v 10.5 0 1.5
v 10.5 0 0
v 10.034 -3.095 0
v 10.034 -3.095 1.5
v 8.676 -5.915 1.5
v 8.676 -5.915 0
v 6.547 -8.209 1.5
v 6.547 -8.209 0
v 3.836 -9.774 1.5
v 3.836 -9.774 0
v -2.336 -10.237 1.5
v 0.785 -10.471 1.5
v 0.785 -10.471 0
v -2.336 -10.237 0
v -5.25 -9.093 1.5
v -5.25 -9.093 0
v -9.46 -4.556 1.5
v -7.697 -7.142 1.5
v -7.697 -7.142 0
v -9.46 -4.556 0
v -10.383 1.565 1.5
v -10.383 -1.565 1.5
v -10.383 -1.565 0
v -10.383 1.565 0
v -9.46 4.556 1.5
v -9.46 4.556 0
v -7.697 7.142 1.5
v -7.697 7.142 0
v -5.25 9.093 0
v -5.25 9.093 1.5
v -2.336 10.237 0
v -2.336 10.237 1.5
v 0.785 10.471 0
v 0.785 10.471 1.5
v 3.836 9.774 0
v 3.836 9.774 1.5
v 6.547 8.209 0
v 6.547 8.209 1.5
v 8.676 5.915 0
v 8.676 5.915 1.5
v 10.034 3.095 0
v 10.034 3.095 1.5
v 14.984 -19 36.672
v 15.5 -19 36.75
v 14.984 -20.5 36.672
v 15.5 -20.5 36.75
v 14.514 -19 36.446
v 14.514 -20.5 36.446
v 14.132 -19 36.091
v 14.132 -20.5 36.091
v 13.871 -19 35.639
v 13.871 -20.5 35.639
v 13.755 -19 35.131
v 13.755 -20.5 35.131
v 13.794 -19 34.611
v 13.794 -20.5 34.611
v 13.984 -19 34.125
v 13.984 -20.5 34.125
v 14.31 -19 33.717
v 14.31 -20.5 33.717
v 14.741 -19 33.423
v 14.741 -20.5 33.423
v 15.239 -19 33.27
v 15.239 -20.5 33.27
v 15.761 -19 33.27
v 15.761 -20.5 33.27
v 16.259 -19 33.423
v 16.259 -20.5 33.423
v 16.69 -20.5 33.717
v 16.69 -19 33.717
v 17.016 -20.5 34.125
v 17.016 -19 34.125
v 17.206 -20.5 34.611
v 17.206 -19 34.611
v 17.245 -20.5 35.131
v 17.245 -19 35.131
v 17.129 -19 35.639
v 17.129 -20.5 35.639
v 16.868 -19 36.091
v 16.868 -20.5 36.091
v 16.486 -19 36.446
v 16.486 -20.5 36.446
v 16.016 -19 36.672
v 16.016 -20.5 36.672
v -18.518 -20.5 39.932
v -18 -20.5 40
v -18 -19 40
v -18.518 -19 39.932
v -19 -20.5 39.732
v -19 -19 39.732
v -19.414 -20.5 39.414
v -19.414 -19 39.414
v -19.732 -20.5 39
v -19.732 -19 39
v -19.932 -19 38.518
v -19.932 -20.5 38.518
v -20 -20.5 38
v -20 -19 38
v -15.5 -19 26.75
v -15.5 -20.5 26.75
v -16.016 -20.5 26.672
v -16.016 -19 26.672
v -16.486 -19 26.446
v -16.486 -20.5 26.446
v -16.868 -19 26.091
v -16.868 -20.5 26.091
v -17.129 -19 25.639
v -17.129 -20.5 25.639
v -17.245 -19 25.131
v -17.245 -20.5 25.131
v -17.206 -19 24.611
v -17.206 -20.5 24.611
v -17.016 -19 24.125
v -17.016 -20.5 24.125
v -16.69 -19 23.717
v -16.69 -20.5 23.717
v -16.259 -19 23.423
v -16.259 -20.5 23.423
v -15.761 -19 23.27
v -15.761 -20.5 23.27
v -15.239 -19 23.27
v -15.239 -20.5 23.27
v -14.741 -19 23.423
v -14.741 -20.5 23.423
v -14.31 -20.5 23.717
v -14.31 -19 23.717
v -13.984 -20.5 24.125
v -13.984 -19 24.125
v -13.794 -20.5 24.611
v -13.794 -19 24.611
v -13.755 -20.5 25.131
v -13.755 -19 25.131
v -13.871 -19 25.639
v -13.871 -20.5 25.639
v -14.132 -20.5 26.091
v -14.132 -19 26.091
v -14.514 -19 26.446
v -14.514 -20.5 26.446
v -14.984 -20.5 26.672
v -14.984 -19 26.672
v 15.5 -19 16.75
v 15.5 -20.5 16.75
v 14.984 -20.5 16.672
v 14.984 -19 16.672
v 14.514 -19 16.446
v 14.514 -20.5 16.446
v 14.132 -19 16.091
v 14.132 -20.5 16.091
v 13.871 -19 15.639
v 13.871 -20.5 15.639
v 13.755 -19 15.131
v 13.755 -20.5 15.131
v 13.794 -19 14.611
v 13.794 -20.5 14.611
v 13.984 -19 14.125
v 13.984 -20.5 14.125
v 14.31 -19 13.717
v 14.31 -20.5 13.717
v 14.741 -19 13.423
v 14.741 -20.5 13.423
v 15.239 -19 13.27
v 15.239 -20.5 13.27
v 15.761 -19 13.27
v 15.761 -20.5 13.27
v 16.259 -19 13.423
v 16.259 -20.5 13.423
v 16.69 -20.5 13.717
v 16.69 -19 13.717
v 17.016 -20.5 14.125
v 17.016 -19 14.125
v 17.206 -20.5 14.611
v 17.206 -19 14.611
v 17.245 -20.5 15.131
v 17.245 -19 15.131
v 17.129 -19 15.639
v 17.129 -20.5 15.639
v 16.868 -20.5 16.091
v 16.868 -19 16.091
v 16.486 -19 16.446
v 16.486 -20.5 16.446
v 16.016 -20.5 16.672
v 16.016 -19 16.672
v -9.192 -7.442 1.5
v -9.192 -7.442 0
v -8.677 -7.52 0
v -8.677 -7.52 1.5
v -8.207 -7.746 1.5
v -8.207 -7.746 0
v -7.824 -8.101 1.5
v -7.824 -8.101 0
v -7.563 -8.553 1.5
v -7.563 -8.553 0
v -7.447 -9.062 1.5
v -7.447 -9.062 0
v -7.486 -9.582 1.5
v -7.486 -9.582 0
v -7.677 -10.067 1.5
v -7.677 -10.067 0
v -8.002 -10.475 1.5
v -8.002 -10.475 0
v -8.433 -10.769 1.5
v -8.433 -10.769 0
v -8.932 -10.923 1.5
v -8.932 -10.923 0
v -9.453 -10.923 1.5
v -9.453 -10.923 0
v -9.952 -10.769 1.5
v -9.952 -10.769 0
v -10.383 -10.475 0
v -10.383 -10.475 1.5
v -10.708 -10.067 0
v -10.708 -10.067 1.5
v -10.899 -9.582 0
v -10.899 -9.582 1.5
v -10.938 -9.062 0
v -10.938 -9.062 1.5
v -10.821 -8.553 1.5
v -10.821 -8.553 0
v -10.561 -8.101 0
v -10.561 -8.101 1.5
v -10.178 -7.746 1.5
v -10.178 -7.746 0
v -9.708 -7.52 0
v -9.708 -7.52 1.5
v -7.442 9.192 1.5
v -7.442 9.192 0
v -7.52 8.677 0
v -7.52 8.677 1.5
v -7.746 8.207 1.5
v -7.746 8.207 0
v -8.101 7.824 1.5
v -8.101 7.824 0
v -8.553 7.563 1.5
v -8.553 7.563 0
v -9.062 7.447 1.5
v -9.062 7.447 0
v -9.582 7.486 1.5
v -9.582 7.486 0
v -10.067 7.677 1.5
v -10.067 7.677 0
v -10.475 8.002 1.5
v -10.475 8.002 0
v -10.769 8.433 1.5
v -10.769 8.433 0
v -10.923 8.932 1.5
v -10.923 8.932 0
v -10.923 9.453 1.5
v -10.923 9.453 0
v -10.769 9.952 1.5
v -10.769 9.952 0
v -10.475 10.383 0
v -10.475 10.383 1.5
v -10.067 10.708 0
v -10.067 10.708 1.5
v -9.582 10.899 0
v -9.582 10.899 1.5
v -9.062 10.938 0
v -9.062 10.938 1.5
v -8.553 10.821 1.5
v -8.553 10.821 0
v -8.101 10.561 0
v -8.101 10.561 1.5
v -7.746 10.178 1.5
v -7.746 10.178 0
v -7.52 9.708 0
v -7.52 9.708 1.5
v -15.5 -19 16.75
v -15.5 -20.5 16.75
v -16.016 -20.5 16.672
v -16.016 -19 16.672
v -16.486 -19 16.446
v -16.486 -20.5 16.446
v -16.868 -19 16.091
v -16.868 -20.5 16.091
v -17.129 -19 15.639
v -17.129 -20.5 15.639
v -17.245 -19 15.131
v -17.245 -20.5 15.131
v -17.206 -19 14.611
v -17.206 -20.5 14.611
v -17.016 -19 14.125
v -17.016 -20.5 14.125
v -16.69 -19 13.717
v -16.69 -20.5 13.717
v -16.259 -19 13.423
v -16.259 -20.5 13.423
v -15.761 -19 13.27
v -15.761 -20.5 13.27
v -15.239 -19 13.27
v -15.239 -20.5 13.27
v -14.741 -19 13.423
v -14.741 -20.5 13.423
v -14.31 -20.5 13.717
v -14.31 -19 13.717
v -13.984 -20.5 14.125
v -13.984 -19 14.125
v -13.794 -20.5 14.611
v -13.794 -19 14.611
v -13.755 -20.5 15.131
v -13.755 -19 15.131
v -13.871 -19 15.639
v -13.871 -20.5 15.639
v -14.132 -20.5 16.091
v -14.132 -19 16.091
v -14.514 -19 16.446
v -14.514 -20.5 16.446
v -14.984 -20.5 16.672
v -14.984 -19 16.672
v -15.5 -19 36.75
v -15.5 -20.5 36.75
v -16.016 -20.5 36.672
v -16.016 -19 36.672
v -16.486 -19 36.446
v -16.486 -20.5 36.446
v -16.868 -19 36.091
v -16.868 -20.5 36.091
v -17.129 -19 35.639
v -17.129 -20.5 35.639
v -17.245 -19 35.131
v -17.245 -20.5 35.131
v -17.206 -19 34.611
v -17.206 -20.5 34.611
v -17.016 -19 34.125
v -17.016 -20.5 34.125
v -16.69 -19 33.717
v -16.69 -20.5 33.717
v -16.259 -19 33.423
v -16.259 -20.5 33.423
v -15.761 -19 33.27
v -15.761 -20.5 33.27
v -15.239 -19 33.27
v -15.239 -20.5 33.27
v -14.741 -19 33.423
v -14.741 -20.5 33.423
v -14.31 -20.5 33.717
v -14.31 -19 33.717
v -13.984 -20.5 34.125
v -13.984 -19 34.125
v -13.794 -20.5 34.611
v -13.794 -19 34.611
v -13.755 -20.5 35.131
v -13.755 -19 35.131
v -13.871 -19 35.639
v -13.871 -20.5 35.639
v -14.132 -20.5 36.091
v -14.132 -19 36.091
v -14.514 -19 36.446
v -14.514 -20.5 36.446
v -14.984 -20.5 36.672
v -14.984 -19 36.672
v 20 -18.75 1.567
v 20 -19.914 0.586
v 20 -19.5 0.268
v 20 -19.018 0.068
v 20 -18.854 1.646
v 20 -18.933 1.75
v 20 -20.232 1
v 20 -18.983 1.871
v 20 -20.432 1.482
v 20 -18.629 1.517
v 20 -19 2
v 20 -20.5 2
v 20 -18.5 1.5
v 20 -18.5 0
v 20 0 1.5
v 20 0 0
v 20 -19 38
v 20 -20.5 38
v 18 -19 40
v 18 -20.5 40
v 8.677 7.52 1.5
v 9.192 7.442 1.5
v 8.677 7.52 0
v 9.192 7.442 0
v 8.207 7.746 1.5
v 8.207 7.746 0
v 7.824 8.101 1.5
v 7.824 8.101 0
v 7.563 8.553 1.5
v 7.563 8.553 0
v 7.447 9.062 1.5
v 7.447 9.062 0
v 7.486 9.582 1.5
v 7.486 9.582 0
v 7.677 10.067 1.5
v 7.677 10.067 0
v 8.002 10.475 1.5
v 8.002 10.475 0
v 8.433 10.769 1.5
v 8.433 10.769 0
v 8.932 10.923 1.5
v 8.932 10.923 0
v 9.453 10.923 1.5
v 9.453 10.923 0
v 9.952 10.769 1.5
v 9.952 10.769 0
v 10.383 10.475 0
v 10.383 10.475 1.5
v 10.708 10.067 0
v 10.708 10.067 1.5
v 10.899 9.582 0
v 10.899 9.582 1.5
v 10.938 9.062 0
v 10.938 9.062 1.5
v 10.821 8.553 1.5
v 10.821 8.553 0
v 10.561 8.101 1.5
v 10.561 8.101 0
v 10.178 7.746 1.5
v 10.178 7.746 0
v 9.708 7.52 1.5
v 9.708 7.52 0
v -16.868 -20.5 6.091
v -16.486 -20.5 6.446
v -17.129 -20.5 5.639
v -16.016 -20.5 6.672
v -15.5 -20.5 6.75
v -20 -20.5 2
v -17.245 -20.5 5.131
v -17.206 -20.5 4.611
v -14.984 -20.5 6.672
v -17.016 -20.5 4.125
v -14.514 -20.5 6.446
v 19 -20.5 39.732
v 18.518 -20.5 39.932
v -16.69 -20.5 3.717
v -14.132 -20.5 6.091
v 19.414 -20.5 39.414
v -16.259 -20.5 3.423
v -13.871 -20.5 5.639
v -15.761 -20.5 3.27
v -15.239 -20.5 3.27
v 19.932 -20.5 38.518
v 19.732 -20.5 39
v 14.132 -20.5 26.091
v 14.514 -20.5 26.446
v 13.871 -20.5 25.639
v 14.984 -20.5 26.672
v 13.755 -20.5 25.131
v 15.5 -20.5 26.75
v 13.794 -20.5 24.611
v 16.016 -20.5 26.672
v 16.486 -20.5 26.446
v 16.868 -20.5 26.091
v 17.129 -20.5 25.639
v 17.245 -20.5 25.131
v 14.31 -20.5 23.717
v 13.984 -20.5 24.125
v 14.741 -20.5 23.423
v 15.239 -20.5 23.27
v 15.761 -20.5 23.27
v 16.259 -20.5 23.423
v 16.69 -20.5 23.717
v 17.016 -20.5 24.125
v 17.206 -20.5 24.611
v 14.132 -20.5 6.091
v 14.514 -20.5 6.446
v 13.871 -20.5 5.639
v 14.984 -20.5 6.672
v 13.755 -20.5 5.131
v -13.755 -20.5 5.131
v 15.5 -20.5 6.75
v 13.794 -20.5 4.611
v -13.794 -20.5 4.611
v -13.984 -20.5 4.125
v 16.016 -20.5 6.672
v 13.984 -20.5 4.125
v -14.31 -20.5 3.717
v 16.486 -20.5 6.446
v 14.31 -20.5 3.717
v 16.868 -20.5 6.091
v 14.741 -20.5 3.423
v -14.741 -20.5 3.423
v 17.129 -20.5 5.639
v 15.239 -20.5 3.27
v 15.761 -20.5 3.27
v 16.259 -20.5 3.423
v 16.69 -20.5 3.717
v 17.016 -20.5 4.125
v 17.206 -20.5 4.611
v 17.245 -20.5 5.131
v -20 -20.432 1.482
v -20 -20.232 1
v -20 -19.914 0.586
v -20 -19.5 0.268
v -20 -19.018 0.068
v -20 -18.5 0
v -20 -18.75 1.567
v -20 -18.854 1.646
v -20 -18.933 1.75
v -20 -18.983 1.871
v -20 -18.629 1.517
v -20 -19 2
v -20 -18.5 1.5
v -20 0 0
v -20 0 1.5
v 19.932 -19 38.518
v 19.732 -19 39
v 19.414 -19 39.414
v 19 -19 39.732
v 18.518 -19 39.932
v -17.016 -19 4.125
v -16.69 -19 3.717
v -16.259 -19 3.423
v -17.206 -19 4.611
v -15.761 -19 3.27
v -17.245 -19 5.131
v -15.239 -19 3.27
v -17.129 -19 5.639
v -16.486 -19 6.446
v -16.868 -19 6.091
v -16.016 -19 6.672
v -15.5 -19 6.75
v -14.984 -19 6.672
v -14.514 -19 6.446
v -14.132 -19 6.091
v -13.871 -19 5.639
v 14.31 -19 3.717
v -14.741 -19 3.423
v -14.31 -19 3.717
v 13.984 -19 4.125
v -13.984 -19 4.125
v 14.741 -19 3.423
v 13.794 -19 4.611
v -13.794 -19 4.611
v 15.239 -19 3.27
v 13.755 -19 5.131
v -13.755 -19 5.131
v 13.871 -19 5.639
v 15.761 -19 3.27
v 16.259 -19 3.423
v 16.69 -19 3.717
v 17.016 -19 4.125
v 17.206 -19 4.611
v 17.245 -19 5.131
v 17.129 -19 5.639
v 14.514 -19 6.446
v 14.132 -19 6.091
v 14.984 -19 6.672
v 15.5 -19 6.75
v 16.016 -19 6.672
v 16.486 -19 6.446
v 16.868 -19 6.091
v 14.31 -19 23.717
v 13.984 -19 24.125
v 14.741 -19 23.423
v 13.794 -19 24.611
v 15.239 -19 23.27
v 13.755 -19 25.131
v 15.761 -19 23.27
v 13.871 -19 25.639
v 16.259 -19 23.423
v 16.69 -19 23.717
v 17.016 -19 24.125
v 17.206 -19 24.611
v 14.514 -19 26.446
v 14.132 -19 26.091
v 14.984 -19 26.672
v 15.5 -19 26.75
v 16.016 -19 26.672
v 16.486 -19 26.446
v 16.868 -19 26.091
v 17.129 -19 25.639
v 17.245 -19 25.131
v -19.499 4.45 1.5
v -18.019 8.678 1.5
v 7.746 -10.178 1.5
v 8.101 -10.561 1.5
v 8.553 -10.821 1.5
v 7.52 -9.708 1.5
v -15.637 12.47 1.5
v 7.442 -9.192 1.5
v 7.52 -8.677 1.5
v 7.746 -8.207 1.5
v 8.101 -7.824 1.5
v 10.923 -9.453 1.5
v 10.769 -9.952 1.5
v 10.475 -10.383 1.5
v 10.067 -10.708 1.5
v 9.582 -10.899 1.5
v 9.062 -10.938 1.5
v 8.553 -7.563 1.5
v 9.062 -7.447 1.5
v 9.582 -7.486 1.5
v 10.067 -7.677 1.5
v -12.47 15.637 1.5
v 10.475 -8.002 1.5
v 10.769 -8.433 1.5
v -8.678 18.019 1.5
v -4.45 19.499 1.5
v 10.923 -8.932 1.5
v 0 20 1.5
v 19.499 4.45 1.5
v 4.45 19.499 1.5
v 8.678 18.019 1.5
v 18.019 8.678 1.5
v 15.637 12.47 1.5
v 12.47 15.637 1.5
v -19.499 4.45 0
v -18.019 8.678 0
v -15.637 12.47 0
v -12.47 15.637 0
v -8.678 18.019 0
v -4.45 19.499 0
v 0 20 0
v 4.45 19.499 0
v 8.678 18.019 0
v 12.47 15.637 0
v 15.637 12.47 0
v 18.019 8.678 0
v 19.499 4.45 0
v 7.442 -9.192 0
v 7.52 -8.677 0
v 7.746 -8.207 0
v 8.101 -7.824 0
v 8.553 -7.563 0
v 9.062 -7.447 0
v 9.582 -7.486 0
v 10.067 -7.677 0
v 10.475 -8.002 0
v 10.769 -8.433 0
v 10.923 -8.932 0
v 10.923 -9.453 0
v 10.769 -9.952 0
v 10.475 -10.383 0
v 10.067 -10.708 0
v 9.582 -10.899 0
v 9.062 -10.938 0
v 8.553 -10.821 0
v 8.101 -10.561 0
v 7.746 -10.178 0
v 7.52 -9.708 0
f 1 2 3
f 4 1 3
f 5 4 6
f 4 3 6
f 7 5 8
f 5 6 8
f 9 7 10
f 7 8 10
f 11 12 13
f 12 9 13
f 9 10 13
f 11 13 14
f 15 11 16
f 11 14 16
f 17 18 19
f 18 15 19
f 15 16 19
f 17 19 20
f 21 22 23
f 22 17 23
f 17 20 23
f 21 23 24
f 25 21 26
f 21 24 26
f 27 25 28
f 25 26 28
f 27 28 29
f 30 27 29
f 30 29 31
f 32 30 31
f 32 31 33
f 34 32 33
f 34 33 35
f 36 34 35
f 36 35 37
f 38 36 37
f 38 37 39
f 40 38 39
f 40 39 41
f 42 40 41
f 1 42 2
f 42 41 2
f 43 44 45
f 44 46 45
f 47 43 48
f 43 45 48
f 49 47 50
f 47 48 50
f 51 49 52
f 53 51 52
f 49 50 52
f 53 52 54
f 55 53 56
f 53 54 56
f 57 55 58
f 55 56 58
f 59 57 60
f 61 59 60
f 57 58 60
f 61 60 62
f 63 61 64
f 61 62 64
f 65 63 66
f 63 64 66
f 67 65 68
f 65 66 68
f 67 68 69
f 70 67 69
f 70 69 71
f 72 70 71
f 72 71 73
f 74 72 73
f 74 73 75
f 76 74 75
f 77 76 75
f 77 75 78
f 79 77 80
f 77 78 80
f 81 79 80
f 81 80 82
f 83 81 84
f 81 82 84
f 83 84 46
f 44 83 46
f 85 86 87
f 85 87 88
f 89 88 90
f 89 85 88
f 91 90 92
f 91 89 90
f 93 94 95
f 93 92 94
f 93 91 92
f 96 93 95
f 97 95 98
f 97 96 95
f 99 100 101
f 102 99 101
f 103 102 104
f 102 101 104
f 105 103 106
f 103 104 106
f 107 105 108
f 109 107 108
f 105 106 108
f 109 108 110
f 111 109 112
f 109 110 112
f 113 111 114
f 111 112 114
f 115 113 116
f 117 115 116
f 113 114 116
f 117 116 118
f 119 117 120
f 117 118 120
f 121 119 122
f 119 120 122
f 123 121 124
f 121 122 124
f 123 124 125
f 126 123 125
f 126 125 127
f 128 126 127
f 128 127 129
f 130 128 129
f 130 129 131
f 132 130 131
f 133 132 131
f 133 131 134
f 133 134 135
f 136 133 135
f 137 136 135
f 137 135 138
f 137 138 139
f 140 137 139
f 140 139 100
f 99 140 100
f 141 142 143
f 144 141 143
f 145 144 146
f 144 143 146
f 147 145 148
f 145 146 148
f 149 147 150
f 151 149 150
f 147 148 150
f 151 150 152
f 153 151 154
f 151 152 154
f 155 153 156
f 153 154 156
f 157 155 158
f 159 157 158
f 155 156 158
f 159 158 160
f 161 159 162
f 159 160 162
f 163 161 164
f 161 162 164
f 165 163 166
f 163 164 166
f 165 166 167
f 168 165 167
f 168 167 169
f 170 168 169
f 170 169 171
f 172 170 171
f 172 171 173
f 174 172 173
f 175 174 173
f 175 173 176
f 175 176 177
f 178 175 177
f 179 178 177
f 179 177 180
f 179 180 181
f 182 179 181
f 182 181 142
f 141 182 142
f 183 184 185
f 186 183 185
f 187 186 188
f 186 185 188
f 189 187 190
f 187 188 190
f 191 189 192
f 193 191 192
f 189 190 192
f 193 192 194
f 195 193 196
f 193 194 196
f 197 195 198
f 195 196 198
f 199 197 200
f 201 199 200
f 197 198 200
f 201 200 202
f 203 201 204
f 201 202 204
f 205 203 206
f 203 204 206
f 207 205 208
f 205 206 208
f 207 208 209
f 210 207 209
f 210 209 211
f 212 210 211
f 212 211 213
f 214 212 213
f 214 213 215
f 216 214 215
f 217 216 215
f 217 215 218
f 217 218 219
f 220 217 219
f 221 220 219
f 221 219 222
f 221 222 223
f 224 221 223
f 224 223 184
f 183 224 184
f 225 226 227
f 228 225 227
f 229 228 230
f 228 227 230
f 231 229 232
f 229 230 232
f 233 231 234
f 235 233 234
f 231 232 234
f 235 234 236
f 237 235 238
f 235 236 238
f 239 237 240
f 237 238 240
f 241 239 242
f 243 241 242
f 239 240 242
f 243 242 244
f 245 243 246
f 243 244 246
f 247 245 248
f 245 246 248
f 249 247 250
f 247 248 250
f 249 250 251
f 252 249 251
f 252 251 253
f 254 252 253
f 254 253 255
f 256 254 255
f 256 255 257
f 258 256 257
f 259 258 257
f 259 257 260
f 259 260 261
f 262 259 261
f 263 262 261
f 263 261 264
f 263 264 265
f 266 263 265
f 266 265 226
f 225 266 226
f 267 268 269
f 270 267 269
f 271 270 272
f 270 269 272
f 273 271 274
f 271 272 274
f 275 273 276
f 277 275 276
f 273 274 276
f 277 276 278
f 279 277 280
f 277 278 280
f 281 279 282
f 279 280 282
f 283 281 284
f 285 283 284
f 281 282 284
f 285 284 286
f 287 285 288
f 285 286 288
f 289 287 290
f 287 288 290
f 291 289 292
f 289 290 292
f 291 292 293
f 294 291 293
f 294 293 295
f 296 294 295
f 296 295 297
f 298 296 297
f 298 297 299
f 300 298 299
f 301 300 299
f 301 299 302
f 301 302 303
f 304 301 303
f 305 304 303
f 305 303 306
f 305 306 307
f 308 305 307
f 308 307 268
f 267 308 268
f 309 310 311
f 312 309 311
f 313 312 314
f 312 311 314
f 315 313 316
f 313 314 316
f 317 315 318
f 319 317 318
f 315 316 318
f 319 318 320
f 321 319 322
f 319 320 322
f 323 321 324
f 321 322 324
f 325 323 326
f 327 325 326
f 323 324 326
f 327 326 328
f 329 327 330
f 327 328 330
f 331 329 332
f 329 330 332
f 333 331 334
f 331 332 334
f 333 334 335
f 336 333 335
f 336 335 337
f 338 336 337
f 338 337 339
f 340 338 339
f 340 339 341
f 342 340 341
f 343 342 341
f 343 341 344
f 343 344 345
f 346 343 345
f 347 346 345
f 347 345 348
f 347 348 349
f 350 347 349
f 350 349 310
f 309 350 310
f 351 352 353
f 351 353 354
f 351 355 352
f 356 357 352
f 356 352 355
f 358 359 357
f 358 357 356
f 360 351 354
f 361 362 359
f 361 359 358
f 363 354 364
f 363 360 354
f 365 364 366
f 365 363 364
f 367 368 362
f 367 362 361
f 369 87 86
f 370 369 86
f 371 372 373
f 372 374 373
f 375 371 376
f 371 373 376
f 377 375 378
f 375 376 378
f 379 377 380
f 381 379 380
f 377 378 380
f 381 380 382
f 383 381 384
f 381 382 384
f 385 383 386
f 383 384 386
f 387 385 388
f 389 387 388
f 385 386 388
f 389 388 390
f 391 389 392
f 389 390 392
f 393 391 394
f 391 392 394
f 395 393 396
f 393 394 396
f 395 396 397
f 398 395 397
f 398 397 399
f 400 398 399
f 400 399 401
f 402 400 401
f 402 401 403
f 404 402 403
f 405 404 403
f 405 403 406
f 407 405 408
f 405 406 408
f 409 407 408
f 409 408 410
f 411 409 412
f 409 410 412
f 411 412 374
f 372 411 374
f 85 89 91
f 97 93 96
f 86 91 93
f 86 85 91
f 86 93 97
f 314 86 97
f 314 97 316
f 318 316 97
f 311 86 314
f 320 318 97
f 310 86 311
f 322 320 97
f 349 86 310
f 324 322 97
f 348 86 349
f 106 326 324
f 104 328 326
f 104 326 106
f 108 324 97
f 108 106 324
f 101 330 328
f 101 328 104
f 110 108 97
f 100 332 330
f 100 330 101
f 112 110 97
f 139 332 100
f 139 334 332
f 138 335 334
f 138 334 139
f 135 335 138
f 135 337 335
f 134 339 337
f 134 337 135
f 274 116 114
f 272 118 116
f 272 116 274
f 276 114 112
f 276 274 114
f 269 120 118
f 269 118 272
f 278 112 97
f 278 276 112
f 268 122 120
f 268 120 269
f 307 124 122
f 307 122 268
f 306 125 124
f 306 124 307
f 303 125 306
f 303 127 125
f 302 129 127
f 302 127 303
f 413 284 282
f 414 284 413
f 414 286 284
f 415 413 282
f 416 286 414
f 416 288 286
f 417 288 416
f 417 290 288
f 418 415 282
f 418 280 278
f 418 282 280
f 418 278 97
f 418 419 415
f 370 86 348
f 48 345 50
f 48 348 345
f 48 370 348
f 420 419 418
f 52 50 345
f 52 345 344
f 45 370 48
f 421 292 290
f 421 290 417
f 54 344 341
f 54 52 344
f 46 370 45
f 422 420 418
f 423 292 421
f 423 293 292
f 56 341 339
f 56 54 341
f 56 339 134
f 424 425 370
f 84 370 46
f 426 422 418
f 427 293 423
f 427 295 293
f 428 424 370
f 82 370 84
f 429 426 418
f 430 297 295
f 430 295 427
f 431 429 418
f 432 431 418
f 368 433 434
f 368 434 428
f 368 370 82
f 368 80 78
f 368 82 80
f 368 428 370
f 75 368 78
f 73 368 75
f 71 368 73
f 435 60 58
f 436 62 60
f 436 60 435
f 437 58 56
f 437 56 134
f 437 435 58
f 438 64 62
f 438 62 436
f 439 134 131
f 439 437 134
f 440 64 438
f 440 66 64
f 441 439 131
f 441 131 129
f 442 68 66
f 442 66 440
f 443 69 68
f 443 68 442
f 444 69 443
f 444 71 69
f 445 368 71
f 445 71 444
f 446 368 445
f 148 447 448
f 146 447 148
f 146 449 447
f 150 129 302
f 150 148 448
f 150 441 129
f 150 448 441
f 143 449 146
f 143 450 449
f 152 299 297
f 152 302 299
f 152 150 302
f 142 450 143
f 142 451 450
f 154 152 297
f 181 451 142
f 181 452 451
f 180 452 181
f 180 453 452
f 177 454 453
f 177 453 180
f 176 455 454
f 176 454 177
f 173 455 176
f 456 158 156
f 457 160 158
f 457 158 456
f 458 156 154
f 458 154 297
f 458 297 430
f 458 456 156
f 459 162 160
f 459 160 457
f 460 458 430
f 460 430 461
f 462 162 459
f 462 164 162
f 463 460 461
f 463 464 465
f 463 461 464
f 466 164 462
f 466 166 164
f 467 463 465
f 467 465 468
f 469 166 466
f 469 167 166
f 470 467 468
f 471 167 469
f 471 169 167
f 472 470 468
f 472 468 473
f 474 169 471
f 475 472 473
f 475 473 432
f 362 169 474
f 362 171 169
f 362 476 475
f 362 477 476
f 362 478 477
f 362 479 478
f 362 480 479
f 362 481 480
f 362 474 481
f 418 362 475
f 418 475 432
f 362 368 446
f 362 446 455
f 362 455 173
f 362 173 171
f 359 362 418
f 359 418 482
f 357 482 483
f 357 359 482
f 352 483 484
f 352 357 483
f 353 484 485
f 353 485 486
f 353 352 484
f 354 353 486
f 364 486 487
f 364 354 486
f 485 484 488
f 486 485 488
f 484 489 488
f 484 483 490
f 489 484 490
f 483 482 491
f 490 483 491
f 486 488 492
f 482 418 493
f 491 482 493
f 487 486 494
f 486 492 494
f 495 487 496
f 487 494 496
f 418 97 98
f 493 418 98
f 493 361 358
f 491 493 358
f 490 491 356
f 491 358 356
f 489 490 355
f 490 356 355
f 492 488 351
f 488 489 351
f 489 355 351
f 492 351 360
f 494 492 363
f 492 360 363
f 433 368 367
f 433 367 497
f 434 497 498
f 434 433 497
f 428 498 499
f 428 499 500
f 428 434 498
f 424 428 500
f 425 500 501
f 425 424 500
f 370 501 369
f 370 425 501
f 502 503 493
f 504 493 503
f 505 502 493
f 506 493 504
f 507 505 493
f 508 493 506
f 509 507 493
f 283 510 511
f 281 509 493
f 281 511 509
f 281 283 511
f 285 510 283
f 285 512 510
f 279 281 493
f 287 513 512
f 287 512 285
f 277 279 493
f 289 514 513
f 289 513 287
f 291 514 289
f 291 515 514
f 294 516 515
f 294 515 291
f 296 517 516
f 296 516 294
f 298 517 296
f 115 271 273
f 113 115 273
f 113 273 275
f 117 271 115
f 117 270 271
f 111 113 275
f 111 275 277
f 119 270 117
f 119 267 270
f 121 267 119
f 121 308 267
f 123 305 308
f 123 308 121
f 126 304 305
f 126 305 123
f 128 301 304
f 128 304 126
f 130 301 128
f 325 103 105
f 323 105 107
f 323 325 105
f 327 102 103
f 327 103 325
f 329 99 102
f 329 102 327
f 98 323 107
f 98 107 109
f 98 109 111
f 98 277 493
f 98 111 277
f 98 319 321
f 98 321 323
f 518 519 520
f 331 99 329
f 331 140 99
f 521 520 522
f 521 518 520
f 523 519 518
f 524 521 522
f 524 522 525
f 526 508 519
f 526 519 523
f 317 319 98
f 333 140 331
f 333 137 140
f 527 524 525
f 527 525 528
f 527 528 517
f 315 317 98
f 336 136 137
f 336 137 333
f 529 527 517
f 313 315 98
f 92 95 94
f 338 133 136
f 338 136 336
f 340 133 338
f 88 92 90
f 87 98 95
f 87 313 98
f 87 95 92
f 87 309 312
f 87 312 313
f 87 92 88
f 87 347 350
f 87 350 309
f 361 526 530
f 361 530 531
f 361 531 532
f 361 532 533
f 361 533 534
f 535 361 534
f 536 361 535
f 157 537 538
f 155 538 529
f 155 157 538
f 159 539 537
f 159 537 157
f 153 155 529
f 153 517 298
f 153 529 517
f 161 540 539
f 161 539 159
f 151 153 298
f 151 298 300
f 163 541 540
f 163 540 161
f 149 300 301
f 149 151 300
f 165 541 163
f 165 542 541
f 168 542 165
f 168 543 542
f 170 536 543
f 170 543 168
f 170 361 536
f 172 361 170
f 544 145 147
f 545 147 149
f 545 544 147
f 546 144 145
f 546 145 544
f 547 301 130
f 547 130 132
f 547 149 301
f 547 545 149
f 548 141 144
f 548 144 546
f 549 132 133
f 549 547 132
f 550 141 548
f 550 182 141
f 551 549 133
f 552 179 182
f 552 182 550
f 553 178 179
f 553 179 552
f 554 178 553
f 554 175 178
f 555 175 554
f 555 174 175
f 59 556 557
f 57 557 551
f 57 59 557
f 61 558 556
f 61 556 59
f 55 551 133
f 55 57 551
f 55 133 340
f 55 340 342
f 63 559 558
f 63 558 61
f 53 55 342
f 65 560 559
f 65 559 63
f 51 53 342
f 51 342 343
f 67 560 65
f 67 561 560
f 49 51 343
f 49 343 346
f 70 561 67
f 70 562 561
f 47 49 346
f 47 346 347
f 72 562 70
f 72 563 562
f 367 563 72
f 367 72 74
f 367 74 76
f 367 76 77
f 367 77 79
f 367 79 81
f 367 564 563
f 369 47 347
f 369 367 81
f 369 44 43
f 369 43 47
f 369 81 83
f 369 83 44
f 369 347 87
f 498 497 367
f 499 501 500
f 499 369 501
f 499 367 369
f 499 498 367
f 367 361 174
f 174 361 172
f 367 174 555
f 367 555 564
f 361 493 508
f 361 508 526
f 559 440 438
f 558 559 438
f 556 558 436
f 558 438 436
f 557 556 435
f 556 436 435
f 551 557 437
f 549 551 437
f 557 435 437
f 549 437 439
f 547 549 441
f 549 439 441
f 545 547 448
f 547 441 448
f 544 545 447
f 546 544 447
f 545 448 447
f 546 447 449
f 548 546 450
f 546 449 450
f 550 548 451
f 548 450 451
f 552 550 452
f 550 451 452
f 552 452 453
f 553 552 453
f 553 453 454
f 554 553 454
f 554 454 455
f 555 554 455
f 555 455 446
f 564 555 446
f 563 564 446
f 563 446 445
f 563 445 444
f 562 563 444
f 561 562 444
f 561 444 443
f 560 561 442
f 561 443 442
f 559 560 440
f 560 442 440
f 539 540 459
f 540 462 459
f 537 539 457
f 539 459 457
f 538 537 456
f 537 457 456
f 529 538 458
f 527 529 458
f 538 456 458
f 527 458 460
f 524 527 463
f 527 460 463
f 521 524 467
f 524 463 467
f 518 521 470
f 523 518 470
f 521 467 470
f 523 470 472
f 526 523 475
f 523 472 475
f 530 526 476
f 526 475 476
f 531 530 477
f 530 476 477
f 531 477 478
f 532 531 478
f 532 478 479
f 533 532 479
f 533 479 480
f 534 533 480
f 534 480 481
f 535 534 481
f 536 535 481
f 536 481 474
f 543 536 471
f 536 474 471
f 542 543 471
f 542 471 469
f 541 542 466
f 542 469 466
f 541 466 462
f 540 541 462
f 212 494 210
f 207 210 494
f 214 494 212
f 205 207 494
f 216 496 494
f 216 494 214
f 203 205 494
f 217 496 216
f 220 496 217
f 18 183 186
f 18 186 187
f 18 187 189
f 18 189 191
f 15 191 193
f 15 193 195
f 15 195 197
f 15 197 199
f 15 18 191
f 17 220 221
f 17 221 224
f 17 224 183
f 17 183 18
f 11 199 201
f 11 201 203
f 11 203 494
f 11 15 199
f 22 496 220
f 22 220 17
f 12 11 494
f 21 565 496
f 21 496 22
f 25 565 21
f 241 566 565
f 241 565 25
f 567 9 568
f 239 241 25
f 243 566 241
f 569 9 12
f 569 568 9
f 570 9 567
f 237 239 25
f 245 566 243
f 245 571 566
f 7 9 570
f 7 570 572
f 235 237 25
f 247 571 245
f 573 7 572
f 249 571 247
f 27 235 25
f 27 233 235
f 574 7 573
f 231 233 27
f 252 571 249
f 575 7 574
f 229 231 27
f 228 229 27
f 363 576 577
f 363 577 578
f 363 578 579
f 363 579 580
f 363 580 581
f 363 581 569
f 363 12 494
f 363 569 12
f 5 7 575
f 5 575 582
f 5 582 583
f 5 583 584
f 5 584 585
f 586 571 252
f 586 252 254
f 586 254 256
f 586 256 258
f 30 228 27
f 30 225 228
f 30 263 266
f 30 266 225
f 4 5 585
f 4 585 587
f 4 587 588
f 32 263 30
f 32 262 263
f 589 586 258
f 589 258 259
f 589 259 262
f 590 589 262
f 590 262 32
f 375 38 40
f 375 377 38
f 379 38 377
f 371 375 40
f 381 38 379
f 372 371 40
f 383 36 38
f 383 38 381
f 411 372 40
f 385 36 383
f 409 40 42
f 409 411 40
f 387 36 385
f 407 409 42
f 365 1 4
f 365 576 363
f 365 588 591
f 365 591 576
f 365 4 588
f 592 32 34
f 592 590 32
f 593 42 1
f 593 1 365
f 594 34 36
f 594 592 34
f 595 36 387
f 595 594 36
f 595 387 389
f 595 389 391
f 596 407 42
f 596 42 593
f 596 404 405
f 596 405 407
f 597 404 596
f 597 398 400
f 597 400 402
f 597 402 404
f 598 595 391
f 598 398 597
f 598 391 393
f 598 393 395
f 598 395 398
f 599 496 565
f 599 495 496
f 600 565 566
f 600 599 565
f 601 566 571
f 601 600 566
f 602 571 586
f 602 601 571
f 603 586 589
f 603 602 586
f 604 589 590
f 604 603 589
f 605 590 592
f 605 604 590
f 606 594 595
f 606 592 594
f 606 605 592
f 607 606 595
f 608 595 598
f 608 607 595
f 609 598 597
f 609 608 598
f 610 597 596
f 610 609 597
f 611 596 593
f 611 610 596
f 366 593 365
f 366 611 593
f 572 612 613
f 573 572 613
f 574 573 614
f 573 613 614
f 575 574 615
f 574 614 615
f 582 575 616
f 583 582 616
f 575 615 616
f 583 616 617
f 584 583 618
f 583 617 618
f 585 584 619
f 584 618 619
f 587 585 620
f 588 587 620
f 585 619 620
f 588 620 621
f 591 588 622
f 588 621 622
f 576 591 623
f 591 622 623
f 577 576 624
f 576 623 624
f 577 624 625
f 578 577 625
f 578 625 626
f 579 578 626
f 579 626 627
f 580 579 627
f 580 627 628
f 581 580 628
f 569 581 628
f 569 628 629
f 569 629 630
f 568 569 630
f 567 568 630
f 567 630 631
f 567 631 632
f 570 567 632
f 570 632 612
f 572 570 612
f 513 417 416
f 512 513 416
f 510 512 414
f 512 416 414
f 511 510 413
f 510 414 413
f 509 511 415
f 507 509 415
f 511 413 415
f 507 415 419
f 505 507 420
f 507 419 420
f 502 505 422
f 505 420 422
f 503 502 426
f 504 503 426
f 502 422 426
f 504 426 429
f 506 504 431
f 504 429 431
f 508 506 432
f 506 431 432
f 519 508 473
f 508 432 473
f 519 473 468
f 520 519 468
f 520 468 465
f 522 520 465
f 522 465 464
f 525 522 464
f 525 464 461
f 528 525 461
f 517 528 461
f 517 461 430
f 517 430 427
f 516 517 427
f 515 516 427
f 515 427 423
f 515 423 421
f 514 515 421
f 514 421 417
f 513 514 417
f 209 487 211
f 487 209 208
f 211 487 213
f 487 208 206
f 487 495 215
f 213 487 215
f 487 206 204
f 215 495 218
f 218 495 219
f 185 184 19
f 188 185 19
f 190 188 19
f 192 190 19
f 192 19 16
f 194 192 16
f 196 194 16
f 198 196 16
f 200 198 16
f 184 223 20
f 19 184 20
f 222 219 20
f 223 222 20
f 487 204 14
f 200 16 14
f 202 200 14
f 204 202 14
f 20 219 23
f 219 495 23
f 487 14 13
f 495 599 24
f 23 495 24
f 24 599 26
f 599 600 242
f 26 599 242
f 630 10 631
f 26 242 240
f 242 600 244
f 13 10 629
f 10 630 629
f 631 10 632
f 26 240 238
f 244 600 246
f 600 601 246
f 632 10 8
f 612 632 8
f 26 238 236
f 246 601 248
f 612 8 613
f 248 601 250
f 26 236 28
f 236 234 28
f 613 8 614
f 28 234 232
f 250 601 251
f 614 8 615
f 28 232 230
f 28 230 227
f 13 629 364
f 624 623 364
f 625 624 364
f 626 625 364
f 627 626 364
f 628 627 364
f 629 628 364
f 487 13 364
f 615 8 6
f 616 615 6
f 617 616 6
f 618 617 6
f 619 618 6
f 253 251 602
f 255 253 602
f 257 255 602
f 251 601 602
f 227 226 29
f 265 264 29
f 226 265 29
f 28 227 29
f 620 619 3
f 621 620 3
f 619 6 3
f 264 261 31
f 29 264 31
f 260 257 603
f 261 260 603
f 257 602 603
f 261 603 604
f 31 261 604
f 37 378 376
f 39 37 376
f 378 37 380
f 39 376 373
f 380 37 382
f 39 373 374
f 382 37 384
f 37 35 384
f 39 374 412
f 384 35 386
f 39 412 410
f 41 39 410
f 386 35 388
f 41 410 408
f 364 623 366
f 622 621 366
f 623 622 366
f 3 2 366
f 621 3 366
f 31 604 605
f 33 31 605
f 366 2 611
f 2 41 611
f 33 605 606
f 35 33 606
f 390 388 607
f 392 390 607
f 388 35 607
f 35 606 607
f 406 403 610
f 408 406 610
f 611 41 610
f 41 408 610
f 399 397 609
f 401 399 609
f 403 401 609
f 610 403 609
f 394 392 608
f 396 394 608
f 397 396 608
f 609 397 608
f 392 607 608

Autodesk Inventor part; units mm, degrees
ref_plane "YZ Plane" through (0, 0, 0) normal (1, 0, 0) x (0, 1, 0)
ref_plane "XZ Plane" through (0, 0, 0) normal (0, 1, 0) x (-1, 0, 0)
ref_plane "XY Plane" through (0, 0, 0) normal (0, 0, 1) x (1, 0, 0)
sketch "Sketch1" plane through (0, 0, 0) normal (0, 0, 1) x (1, 0, 0)
  line L0 (20, 0) -> (20, -20.5)
  line L1 (20, -20.5) -> (-20, -20.5)
  line L2 (-20, -20.5) -> (-20, 0)
  arc A0 (20, 0) -> (-20, 0) centre (0, 0) ccw
  circle A1 centre (0, 0) radius 10.5
  dimension "d1" = 40
  dimension "d4" = 20
  dimension "d5" = 20.5
  dimension "d7" = 21
  dimension "d8" = 20
  dimension "MotorCenterOffset" = 20.5
extrude "Plate1" add sketch "Sketch1" along normal blind 1.5
sketch "Sketch3" plane through (20, -19, 0) normal (0, -1, 0) x (1, 0, 0)
  line L0 (-40, 0) -> (0, 0)
  line L1 (0, 0) -> (0, 40)
  line L2 (0, 40) -> (-40, 40)
  line L3 (-40, 40) -> (-40, 0)
edge flange "Flange1" height 40 angle 90 thickness 1.5 bend radius 0.5 thickness toward (0, -1, 0) relief tear relief width 1.5 relief depth 0.75 edges at (0, -20.5, 1.5) wall of the first edge with corners at (-20, -19, 0) (20, -19, 0) (20, -19, 40) (-20, -19, 40)
bend "Bend1"
corner "Corner1"
fillet "Corner Round1" radius 2 1 edges at (-20, -19.75, 40)
fillet "Corner Round1" radius 2 1 edges at (20, -19.75, 40)
sketch "Sketch4" plane through (-20, -19, 2) normal (0, 1, 0) x (1, 0, 0)
  line L0 (2, -38) -> (38, -38) projected
  line L1 (0, -36) -> (0, 0) projected
  line L2 (0, -33) -> (4.5, -33)
  line L3 (4.5, -33) -> (4.5, -38)
  point P0 (20, 2)
  dimension "d43" = 4.5
  dimension "d44" = 5
hole "Hole2" at (-15.5, -19, 35) direction (0, -1, 0) diameter 3.5 end through all
pattern_linear "Rectangular Pattern2" count 4 spacing 10 along (0, 0, -1) count 2 spacing 31 along (1, 0, 0) of "Hole2"
sketch "Sketch5" plane through (0, 0, 1.5) normal (0, 0, 1) x (1, 0, 0)
  line L0 (-20, -18.5) -> (-20, 0) projected
  circle A0 centre (0, 0) radius 10.5 projected
  line L1 (0, 0) -> (9.1924, 9.1924)
  circle A1 centre (0, 0) radius 13
  line L2 (0, 0) -> (13, 0)
  circle A2 centre (9.1924, 9.1924) radius 1.75
  dimension "d59" = 26
  dimension "d60" = 45
  dimension "d61" = 3.5
hole "Hole3" at (9.1924, 9.1924, 1.5) direction (0, 0, -1) diameter 3.5 end through all
pattern_circular "Circular Pattern1" count 4 over 360 about axis through (0, 0, 0) along (0, 0, 1) of "Hole3"
equation "\"d50\" = Thickness"
equation "\"d12\" = BendReliefWidth"
equation "\"d13\" = BendReliefDepth"
equation "\"d14\" = MinimumRemnant"
equation "\"d15\" = BendRadius"
equation "\"d19\" = CornerReliefSize"
equation "\"d20\" = GapSize"
equation "\"d21\" = JacobiRadiusSize"
equation "\"BendRadius\" = Thickness"
equation "\"BendReliefWidth\" = Thickness"
equation "\"BendReliefDepth\" = 0.5 * Thickness"
equation "\"CornerReliefSize\" = 4 * Thickness"
equation "\"MinimumRemnant\" = 2 * Thickness"
equation "\"TransitionRadius\" = BendRadius"
equation "\"JacobiRadiusSize\" = BendRadius"
equation "\"GapSize\" = Thickness"
equation "\"d10\" = BendRadius"
equation "\"Thickness\" = 1.5"
properties part number "HD-BK-IG" material "Galvanized Steel"
